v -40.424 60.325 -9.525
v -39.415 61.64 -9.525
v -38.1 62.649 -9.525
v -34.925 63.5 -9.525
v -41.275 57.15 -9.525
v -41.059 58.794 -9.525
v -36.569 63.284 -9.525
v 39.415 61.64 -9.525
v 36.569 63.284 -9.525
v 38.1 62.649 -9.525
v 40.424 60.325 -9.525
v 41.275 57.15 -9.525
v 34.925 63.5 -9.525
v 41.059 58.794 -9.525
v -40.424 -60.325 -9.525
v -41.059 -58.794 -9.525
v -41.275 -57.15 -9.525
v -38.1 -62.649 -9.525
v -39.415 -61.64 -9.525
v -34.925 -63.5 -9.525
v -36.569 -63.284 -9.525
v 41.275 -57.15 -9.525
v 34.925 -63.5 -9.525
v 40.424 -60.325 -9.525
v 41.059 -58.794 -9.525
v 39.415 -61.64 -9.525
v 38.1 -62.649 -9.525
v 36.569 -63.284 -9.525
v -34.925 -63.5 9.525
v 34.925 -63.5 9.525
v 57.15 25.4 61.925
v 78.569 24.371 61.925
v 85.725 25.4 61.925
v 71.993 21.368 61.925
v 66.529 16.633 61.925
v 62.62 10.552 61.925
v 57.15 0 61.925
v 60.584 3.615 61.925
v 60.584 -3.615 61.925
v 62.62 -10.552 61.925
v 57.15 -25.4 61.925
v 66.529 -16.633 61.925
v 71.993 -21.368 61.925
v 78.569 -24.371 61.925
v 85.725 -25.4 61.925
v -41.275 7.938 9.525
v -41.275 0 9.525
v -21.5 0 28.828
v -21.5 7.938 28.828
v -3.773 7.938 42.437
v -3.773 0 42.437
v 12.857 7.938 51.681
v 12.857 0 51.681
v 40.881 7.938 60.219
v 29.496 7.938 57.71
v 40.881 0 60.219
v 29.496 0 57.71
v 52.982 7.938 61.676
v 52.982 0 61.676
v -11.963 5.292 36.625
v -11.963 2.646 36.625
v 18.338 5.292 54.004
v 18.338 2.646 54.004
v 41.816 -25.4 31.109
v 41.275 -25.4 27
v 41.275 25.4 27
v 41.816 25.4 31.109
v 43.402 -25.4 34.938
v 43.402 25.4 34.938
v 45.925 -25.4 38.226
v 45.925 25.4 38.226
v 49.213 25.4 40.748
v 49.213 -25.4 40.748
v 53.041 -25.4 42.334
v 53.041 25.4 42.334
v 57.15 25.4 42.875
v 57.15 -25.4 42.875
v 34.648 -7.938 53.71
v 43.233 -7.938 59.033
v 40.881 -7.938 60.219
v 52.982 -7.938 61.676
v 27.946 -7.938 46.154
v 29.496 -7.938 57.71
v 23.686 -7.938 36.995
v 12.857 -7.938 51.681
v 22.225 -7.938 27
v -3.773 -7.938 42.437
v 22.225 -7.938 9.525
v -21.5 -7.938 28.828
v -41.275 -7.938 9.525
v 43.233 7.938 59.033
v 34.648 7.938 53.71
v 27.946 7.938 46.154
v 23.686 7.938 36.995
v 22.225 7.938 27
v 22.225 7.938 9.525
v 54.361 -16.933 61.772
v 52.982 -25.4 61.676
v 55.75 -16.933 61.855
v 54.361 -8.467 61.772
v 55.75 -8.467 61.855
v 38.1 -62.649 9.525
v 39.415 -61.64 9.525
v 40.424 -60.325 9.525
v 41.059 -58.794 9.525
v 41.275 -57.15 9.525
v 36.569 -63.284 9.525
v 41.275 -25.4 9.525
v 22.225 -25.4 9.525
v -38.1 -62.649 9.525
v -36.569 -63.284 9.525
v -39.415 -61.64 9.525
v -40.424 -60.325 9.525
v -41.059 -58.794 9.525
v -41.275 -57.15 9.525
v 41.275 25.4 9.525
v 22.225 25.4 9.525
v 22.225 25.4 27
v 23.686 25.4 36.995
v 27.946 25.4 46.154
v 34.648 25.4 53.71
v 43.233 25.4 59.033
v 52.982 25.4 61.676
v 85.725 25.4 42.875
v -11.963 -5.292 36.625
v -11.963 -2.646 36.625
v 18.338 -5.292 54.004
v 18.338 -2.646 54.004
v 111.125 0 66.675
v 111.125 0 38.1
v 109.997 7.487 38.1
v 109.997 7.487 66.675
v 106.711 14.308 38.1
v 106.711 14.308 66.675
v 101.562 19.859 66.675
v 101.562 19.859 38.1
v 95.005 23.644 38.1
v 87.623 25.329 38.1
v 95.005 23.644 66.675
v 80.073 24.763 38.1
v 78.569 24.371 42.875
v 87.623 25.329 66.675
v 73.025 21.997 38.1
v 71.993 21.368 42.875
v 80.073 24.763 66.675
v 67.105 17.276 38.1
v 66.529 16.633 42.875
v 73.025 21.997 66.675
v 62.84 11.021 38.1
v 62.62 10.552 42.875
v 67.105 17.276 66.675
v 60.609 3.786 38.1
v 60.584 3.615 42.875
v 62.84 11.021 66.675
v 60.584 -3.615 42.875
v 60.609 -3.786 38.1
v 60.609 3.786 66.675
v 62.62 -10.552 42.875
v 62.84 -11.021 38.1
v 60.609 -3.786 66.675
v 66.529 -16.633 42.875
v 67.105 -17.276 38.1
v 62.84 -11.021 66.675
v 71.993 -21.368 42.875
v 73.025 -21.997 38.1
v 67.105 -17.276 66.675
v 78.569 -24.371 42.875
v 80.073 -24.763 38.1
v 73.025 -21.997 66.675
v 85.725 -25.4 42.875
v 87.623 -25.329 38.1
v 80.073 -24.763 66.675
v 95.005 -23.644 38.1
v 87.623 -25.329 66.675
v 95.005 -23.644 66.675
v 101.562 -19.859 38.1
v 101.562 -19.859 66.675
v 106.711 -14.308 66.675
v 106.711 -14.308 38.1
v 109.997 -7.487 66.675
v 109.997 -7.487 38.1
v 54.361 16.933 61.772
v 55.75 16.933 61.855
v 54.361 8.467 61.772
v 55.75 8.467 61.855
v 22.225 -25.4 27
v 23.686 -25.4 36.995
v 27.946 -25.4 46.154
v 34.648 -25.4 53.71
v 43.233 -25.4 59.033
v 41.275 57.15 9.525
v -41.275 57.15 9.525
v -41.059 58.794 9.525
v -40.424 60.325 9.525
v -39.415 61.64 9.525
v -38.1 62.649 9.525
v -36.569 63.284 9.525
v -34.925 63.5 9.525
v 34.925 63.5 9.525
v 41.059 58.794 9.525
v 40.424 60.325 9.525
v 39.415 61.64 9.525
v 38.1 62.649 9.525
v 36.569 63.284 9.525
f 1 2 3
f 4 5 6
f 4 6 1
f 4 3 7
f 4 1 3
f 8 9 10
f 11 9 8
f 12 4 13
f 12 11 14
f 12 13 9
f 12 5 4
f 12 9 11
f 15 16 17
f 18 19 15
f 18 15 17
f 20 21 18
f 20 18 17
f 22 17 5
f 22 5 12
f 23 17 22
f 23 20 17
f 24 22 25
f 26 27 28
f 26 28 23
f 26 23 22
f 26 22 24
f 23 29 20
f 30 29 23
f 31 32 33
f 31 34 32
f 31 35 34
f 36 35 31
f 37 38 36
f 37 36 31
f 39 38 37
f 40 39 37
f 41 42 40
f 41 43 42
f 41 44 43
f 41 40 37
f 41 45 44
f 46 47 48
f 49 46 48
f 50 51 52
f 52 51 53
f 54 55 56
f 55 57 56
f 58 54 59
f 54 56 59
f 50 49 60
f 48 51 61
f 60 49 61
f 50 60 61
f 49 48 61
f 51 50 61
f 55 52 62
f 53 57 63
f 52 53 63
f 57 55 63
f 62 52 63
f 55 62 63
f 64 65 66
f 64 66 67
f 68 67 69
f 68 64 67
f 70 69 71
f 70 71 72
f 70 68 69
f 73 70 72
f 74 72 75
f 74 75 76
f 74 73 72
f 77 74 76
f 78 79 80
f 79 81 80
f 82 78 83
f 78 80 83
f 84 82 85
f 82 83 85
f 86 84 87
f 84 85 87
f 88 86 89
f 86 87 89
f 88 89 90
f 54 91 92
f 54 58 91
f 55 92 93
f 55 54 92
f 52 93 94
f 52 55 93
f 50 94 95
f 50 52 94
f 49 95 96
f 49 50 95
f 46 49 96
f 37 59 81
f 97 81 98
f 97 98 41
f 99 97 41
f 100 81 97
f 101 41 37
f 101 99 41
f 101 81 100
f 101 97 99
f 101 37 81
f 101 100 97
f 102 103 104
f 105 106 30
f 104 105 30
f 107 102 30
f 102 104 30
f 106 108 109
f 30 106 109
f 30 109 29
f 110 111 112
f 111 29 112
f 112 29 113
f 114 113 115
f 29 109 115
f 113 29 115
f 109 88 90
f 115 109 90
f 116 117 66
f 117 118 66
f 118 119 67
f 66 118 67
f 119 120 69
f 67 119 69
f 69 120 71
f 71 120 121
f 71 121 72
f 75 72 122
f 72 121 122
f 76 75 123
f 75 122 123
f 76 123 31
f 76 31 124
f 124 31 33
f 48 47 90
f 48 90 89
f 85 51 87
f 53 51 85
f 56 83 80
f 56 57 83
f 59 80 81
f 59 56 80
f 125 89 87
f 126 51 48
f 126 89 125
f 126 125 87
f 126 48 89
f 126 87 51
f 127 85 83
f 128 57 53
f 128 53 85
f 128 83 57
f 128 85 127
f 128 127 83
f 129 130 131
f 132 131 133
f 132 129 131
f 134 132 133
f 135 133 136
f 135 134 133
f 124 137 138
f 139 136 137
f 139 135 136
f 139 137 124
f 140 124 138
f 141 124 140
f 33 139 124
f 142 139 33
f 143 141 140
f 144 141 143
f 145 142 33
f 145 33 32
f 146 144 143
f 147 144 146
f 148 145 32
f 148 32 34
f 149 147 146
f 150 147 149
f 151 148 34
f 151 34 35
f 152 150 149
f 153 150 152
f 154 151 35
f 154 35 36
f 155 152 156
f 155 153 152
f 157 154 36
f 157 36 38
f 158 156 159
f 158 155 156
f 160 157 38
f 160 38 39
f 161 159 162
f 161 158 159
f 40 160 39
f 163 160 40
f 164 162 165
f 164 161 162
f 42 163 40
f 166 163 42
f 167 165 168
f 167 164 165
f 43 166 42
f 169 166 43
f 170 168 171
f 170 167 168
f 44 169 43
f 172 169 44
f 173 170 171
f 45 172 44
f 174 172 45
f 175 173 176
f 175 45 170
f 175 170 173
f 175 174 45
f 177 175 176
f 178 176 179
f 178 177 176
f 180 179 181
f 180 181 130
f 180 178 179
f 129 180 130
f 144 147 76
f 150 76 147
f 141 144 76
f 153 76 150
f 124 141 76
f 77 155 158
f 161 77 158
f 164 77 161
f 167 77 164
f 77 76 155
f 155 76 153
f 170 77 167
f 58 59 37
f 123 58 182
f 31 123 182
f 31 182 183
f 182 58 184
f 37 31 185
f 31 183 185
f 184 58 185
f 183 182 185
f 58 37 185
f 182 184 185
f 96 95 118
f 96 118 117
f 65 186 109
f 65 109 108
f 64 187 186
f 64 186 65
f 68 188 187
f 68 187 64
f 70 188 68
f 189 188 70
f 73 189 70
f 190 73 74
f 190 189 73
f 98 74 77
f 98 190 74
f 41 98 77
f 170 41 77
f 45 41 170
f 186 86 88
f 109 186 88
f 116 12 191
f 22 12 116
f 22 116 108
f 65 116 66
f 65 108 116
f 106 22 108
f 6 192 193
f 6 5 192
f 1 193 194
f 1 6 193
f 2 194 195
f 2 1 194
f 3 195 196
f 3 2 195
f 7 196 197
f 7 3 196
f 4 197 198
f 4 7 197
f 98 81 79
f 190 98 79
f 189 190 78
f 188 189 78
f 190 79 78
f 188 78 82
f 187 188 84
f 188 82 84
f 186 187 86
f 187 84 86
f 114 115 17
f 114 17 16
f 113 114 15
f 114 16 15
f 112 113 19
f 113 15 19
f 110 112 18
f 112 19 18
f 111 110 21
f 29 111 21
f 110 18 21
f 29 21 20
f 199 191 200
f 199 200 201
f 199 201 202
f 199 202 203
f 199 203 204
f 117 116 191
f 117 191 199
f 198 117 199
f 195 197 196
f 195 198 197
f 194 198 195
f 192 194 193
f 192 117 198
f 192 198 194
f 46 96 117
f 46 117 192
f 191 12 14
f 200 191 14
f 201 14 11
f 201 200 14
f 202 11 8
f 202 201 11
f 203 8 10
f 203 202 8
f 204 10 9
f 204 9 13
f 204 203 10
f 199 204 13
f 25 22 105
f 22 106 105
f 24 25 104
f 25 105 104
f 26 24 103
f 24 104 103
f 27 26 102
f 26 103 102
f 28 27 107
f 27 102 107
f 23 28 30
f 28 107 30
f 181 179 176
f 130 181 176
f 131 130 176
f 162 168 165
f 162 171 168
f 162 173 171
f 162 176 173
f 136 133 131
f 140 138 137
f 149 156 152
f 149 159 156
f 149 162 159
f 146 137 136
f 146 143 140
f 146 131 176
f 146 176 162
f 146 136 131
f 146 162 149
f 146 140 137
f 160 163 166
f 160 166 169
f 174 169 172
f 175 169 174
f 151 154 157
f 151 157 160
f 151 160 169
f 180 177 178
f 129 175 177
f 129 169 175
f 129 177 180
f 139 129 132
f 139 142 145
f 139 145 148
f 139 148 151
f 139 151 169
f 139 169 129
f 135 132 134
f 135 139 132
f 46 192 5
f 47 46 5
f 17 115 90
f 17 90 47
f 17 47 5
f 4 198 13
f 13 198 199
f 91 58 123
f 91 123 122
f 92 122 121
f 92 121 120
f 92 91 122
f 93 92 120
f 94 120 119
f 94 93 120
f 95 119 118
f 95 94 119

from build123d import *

# Parameters (mm, degrees)
F1_DEPTH = 63.5
F0_W     = 25.4
F0_H     = 19.05
F2_DEPTH = 25.4
F3_DEPTH = 7.9375
F4_DEPTH = 25.4
F5_DEPTH = 63.5
F7_R     = 6.35


with BuildPart() as f1:
    # F0 (on Front) → F1 (new body)
    with BuildSketch(Plane.XZ):
        Polygon((-41.275, 9.525), (-41.275, -9.525), (41.275, -9.525), (41.275, 9.525), (22.225, 9.525), align=None)
    extrude(amount=F1_DEPTH)

    # F0 (on Front) → F2 (join)
    with BuildSketch(Plane.XZ):
        with Locations((73.025, 52.4002)):
            Rectangle(F0_W, F0_H)
        with BuildLine():
            Line((22.225, 9.525), (41.275, 9.525))
            Line((41.275, 9.525), (41.275, 27.0002))
            ThreePointArc((41.275, 27.0002), (45.9246798487, 38.2255201513), (57.15, 42.8752))
            Line((57.15, 42.8752), (60.325, 42.8752))
            Line((60.325, 42.8752), (60.325, 61.9252))
            Line((60.325, 61.9252), (57.15, 61.9252))
            add(Edge.make_bspline(
                [(52.9823235554, 61.6756394068), (54.3561666256, 61.7778957216), (55.7451531138, 61.8610815688), (57.15, 61.9252)],
                knots=[107.6072789541, 107.6072789541, 107.6072789541, 107.6072789541, 111.5045361635, 111.5045361635, 111.5045361635, 111.5045361635], degree=3))
            ThreePointArc((52.9823235554, 61.6756394068), (31.0223161682, 50.1756128892), (22.225, 27.0002))
            Line((22.225, 27.0002), (22.225, 9.525))
        make_face()
    extrude(amount=F2_DEPTH)

    # F0 (on Front) → F3 (join, symmetric)
    with BuildSketch(Plane.XZ):
        with BuildLine():
            add(Edge.make_bspline(
                [(-41.275, 9.525), (-11.3392454838, 41.4901042483), (15.0491037151, 58.8522374069), (52.9823235554, 61.6756394068)],
                knots=[0, 0, 0, 0, 107.6072789541, 107.6072789541, 107.6072789541, 107.6072789541], degree=3))
            Line((-41.275, 9.525), (22.225, 9.525))
            Line((22.225, 9.525), (22.225, 27.0002))
            ThreePointArc((22.225, 27.0002), (31.0223161682, 50.1756128892), (52.9823235554, 61.6756394068))
        make_face()
    extrude(amount=F3_DEPTH, both=True)

    # F0 (on Front) → F4 (join, symmetric)
    with BuildSketch(Plane.XZ):
        with BuildLine():
            Line((22.225, 9.525), (41.275, 9.525))
            Line((41.275, 9.525), (41.275, 27.0002))
            ThreePointArc((41.275, 27.0002), (45.9246798487, 38.2255201513), (57.15, 42.8752))
            Line((57.15, 42.8752), (60.325, 42.8752))
            Line((60.325, 42.8752), (60.325, 61.9252))
            Line((60.325, 61.9252), (57.15, 61.9252))
            add(Edge.make_bspline(
                [(52.9823235554, 61.6756394068), (54.3561666256, 61.7778957216), (55.7451531138, 61.8610815688), (57.15, 61.9252)],
                knots=[107.6072789541, 107.6072789541, 107.6072789541, 107.6072789541, 111.5045361635, 111.5045361635, 111.5045361635, 111.5045361635], degree=3))
            ThreePointArc((52.9823235554, 61.6756394068), (31.0223161682, 50.1756128892), (22.225, 27.0002))
            Line((22.225, 27.0002), (22.225, 9.525))
        make_face()
        with Locations((73.025, 52.4002)):
            Rectangle(F0_W, F0_H)
    extrude(amount=F4_DEPTH, both=True)

    # F0 (on Front) → F5 (join)
    with BuildSketch(Plane.XZ):
        Polygon((-41.275, 9.525), (-41.275, -9.525), (41.275, -9.525), (41.275, 9.525), (22.225, 9.525), align=None)
    extrude(amount=-F5_DEPTH)

    # F0 (on Front) → F6 (revolve)
    with BuildSketch(Plane.XZ):
        Polygon((85.725, 66.675), (85.725, 61.9252), (85.725, 42.8752), (85.725, 38.1), (111.125, 38.1), (111.125, 66.675), align=None)
    revolve(axis=Axis((85.725, 0, 52.3875), (0, 0, 1)))

    # F7
    f7_edges = [f1.edges().sort_by_distance(p)[0] for p in [
        (-41.275, -63.5, 0),
        (41.275, -63.5, 0),
        (41.275, 63.5, 0),
        (-41.275, 63.5, 0),
    ]]
    fillet(f7_edges, radius=F7_R)


solid = f1.part
